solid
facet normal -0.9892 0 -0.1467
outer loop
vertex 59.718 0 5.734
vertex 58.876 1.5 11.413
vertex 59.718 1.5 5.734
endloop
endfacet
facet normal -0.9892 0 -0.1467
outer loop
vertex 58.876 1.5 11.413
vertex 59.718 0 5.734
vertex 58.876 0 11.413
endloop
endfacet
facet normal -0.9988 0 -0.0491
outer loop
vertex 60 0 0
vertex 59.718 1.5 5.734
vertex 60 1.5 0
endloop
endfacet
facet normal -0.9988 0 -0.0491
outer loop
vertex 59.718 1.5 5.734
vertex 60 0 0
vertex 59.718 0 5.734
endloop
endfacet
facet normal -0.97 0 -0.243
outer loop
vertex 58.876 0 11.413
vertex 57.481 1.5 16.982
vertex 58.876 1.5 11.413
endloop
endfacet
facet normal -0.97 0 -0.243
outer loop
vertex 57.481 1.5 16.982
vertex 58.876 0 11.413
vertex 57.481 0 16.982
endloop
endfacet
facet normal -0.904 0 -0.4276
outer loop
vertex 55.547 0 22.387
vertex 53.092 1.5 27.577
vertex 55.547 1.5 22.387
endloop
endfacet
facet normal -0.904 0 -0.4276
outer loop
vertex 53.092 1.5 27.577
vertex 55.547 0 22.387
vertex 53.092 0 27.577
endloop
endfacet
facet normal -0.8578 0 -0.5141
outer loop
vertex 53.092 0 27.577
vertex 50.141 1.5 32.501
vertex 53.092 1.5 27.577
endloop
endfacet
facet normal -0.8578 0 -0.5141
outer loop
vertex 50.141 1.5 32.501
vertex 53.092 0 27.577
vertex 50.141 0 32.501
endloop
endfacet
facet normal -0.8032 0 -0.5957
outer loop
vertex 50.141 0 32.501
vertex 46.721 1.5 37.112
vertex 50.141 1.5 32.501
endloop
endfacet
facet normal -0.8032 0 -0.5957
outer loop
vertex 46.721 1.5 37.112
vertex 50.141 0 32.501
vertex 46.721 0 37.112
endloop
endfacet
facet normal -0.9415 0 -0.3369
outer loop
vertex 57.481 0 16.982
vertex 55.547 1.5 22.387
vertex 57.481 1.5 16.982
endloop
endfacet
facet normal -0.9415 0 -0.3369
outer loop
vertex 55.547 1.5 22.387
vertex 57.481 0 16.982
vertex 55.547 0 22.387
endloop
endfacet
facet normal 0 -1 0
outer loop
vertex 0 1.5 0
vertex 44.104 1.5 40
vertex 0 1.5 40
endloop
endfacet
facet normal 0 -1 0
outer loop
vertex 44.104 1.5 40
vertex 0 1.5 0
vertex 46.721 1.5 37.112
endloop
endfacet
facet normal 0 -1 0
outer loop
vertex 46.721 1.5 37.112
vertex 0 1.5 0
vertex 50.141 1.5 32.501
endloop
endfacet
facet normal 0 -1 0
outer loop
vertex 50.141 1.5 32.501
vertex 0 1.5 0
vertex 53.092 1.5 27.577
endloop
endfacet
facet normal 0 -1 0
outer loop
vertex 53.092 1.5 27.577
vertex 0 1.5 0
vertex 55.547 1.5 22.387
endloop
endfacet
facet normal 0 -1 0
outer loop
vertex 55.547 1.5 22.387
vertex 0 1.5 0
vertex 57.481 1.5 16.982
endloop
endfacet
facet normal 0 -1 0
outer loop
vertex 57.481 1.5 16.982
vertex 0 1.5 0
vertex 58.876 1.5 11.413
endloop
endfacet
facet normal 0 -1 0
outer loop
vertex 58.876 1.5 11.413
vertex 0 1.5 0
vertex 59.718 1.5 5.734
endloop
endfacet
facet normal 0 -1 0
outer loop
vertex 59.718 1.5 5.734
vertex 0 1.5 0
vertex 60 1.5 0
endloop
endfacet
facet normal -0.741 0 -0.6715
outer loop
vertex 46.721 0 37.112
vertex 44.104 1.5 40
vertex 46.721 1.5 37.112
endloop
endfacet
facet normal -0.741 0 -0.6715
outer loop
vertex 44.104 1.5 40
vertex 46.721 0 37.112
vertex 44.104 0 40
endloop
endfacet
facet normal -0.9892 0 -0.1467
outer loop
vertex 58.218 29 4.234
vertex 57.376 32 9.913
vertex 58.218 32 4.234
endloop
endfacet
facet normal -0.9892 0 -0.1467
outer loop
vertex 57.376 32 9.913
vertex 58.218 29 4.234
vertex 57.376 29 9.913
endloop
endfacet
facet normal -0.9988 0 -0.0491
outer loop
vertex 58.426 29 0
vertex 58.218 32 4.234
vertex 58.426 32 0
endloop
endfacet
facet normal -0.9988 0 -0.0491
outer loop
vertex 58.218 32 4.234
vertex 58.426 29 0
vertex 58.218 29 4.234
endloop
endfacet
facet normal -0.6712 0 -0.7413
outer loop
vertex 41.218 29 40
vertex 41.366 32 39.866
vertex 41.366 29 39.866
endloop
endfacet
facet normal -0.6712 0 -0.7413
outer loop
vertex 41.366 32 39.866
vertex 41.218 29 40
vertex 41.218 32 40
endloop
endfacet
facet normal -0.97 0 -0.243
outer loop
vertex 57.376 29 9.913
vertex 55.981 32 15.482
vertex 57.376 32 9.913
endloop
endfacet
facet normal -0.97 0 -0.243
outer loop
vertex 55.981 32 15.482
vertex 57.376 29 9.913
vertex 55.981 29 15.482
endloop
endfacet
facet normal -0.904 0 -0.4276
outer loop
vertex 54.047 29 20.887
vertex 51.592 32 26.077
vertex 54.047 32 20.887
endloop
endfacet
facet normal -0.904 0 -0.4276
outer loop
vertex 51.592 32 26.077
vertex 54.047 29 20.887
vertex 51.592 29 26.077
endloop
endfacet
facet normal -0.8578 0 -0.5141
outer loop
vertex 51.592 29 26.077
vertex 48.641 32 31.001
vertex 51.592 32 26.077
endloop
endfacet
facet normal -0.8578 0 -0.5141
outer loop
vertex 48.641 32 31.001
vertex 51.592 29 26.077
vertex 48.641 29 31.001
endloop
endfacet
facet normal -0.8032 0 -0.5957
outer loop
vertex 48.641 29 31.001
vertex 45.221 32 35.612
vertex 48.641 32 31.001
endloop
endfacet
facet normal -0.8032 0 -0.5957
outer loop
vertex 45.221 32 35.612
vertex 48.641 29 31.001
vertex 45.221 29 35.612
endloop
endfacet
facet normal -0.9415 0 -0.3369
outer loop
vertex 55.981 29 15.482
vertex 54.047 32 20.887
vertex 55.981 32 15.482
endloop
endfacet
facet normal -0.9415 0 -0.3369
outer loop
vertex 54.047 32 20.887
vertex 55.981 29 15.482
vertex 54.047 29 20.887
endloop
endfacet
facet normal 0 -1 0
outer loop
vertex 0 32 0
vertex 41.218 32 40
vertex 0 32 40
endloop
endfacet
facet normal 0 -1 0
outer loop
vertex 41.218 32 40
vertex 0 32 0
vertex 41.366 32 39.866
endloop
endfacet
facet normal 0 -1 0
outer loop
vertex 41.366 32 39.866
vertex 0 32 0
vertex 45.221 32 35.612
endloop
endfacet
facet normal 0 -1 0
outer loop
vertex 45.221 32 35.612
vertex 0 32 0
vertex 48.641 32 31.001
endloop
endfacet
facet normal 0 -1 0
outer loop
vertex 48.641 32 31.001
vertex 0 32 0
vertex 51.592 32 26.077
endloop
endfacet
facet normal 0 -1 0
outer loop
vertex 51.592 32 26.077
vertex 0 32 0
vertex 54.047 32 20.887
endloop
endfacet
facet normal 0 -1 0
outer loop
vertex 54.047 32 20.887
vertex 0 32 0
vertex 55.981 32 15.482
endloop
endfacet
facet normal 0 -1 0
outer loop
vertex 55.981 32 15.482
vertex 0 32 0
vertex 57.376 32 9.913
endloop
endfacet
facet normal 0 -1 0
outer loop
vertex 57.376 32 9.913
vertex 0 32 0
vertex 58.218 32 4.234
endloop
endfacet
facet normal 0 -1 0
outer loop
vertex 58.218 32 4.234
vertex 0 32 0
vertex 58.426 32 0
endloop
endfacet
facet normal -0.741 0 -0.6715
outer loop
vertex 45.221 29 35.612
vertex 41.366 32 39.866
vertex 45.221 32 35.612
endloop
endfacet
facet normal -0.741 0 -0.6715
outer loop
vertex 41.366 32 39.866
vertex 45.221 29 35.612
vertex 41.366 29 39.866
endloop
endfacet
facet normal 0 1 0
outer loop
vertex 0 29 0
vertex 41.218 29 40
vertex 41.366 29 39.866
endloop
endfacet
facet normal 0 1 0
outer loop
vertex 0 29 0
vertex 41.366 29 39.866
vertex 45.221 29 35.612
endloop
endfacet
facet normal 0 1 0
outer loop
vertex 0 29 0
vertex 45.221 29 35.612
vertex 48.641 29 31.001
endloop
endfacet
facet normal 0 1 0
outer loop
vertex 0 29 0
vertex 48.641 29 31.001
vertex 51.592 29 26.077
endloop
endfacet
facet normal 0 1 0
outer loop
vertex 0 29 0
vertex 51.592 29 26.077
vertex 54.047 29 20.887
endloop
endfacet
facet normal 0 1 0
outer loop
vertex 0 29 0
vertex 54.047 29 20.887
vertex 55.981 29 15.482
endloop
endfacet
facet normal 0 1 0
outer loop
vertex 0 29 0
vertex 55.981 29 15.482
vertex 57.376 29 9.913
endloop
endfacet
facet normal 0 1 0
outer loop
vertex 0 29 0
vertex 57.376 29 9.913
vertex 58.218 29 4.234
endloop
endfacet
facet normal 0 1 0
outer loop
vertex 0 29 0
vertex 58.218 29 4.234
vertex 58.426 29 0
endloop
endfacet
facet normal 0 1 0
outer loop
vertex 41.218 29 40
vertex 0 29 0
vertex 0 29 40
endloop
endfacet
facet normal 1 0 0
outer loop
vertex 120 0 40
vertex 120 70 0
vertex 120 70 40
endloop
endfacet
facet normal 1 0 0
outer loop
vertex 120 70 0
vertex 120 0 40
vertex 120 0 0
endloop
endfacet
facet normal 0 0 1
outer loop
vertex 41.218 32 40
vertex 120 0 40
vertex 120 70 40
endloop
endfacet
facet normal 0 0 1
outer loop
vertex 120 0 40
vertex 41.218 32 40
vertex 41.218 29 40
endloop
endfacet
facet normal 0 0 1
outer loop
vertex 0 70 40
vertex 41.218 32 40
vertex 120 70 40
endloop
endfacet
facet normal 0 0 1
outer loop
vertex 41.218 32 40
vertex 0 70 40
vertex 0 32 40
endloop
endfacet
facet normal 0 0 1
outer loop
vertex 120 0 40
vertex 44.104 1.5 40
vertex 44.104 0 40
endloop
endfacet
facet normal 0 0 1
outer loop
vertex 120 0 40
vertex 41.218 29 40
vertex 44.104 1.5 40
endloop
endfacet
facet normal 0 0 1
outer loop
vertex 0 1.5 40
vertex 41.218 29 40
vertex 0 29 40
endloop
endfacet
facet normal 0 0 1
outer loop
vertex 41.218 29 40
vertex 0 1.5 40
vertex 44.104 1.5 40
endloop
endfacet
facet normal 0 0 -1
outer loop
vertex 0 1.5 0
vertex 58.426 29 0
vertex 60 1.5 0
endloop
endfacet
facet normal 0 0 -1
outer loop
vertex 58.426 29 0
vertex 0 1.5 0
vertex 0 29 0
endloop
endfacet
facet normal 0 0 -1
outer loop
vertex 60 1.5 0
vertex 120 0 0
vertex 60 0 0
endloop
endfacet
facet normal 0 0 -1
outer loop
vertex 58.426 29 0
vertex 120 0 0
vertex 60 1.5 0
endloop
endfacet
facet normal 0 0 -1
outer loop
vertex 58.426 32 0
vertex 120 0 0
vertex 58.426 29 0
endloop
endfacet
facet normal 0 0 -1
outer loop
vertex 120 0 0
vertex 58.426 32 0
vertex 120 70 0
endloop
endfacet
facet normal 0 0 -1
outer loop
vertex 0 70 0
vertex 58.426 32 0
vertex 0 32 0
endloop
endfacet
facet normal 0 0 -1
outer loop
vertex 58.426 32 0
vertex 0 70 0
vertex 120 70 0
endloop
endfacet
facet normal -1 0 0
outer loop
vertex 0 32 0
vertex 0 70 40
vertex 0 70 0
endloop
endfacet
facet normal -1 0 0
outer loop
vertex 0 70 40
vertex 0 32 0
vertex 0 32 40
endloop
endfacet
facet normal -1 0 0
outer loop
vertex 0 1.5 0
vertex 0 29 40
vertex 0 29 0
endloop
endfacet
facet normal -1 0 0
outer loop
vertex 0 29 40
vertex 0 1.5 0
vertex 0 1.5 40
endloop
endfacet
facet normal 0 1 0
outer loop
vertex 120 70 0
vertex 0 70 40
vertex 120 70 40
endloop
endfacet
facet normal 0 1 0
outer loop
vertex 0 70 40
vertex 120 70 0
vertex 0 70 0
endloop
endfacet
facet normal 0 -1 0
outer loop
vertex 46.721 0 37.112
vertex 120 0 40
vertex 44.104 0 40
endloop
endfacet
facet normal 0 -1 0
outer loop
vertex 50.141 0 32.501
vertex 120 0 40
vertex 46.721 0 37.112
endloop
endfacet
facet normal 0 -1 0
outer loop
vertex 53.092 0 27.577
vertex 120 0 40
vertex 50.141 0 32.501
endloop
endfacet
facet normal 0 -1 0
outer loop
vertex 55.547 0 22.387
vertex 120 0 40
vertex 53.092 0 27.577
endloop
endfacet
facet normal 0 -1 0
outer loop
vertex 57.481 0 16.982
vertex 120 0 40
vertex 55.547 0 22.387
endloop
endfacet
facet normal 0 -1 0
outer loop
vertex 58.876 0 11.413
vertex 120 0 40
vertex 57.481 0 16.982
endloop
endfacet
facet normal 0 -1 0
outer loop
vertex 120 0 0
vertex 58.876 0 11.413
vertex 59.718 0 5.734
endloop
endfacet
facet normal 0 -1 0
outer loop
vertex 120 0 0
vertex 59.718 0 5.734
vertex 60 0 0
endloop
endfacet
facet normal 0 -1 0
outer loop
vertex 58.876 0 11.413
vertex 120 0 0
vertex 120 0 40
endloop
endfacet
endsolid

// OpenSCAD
// Dimensions in millimetres
$fn = 64;
outer_width = 120;      // X outer dimension
outer_length = 70;     // Y outer dimension
outer_height = 40;     // Z outer dimension
wall_thickness = 3;    // Wall thickness (mm)
floor_thickness = 3;   // Floor thickness (mm)

// Platform dimensions and position
platform_x_span = 60;   // X length of platform (centred)
platform_z_elevation = floor_thickness + 10;  // Z elevation above inner floor

// Buffer chamber electrode holes
hole_diameter = 2;
hole_z_position = outer_height - wall_thickness; // Hole at z=30mm from bottom

module tank_wall() {
    translate([wall_thickness/2, wall_thickness/2, 0])
        rotate([90, 0, 0]) cylinder(h=outer_height, r=(outer_width - wall_thickness)/2);
}

module tank_floor() {
    translate([-wall_thickness/2, wall_thickness/2, -floor_thickness/2])
        rotate([90, 0, 0]) cylinder(h=floor_thickness, r=(outer_length - wall_thickness)/2);
}

// Platform
module platform() {
    translate([-(platform_x_span / 2), outer_length/2 - wall_thickness, platform_z_elevation])
        linear_extrude(height=outer_length - wall_thickness * 2)
            polygon(points=[
                [platform_x_span/2, 0],
                [-platform_x_span/2, 0],
                [-platform_x_span/2, outer_length - wall_thickness*2]
            ]);
}

// Buffer chamber cutouts and electrode holes
module buffer_holes() {
    // Left hole (X = -60 to 0)
    translate([-outer_width / 2 + wall_thickness, outer_length / 2 - wall_thickness, 0])
        difference() {
            cube([wall_thickness * 2, wall_thickness * 2, outer_height]);
            translate([0, 0, hole_z_position])
                cylinder(d=hole_diameter, h=(outer_height - hole_z_position));
        }

    // Right hole (X = 60 to 120)
    translate([outer_width / 2 - wall_thickness, outer_length / 2 - wall_thickness, 0])
        difference() {
            cube([wall_thickness * 2, wall_thickness * 2, outer_height]);
            translate([0, 0, hole_z_position])
                cylinder(d=hole_diameter, h=(outer_height - hole_z_position));
        }
}

// Main assembly
difference() {
    // Outer tank shell
    cube([outer_width, outer_length, outer_height]);

    // Subtract walls and floor
    union() {
        translate([wall_thickness/2, wall_thickness/2, 0])
            rotate([90, 0, 0]) cylinder(h=outer_height, r=(outer_width - wall_thickness)/2);
        translate([-wall_thickness/2, wall_thickness/2, 0])
            rotate([90, 0, 0]) cylinder(h=outer_height, r=(outer_length - wall_thickness)/2);

        // Subtract inner floor
        translate([0, outer_length / 2 - wall_thickness, -floor_thickness/2])
            rotate([90, 0, 0]) cylinder(h=floor_thickness, r=(outer_width - wall_thickness)/2);
    }

    // Platform and buffer holes (cutting through tank walls)
    union() {
        platform();
        difference() {
            translate([-outer_width / 2 + wall_thickness, outer_length / 2 - wall_thickness, 0])
                cube([wall_thickness * 2, outer_length - wall_thickness*2, outer_height]);
            buffer_holes();
        }
    }
}
